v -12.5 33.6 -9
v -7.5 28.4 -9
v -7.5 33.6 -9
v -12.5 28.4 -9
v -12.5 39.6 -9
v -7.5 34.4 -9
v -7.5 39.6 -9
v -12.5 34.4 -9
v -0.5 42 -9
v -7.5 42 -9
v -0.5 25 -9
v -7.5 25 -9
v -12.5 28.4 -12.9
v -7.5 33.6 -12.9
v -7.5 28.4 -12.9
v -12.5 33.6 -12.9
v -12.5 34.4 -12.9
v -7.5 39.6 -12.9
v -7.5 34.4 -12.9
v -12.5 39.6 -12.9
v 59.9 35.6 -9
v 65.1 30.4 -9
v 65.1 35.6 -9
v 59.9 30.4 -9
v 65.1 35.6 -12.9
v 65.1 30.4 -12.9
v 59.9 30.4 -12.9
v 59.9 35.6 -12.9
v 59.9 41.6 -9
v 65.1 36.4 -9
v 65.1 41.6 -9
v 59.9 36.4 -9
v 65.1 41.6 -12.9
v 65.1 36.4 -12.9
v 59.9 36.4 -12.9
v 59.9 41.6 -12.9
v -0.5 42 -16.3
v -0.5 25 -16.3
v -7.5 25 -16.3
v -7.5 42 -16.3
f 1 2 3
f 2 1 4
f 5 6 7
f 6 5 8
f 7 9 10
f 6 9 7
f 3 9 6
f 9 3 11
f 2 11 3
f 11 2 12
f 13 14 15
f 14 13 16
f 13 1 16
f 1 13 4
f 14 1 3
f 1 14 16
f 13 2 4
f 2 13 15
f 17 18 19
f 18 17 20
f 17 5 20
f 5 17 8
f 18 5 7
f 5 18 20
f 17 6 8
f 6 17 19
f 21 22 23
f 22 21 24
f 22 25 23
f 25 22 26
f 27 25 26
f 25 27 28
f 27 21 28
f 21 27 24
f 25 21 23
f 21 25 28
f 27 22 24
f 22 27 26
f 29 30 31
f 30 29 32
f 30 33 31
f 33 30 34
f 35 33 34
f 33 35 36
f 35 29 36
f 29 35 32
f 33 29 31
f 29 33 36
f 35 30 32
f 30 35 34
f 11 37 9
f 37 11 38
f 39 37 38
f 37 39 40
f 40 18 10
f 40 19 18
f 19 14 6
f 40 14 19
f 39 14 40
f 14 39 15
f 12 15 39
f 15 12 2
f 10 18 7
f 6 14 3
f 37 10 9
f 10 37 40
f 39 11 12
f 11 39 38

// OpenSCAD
// Service and installed harness envelopes only; translucent volumes are not fabricated parts.
// Primary left: preserve twist, maximum6mm round bundle,≤1.3mmstrap; maxstack7.3mm.
color([0,0.4,1,.2])translate([-7.5,25,-16.3])cube([7,17,7.3]);
// Side parked T18R head volumes; do not put3.7mmheads beneath6mmbundle.
for(y=[31,37])color([0,0.8,1,.3])translate([-12.5,y-2.6,-12.9])cube([5.2,5.2,3.9]);
// Right coax service loop only; SMA bulkhead carries external coax pull.
for(y=[33,39]){
 color([0,.4,1,.2])translate([60.55,y-.8,-11.8])cube([3.9,1.6,2.8]);
 color([0,.8,1,.3])translate([59.9,y-2.6,-12.9])cube([5.2,5.2,3.9]);
}
